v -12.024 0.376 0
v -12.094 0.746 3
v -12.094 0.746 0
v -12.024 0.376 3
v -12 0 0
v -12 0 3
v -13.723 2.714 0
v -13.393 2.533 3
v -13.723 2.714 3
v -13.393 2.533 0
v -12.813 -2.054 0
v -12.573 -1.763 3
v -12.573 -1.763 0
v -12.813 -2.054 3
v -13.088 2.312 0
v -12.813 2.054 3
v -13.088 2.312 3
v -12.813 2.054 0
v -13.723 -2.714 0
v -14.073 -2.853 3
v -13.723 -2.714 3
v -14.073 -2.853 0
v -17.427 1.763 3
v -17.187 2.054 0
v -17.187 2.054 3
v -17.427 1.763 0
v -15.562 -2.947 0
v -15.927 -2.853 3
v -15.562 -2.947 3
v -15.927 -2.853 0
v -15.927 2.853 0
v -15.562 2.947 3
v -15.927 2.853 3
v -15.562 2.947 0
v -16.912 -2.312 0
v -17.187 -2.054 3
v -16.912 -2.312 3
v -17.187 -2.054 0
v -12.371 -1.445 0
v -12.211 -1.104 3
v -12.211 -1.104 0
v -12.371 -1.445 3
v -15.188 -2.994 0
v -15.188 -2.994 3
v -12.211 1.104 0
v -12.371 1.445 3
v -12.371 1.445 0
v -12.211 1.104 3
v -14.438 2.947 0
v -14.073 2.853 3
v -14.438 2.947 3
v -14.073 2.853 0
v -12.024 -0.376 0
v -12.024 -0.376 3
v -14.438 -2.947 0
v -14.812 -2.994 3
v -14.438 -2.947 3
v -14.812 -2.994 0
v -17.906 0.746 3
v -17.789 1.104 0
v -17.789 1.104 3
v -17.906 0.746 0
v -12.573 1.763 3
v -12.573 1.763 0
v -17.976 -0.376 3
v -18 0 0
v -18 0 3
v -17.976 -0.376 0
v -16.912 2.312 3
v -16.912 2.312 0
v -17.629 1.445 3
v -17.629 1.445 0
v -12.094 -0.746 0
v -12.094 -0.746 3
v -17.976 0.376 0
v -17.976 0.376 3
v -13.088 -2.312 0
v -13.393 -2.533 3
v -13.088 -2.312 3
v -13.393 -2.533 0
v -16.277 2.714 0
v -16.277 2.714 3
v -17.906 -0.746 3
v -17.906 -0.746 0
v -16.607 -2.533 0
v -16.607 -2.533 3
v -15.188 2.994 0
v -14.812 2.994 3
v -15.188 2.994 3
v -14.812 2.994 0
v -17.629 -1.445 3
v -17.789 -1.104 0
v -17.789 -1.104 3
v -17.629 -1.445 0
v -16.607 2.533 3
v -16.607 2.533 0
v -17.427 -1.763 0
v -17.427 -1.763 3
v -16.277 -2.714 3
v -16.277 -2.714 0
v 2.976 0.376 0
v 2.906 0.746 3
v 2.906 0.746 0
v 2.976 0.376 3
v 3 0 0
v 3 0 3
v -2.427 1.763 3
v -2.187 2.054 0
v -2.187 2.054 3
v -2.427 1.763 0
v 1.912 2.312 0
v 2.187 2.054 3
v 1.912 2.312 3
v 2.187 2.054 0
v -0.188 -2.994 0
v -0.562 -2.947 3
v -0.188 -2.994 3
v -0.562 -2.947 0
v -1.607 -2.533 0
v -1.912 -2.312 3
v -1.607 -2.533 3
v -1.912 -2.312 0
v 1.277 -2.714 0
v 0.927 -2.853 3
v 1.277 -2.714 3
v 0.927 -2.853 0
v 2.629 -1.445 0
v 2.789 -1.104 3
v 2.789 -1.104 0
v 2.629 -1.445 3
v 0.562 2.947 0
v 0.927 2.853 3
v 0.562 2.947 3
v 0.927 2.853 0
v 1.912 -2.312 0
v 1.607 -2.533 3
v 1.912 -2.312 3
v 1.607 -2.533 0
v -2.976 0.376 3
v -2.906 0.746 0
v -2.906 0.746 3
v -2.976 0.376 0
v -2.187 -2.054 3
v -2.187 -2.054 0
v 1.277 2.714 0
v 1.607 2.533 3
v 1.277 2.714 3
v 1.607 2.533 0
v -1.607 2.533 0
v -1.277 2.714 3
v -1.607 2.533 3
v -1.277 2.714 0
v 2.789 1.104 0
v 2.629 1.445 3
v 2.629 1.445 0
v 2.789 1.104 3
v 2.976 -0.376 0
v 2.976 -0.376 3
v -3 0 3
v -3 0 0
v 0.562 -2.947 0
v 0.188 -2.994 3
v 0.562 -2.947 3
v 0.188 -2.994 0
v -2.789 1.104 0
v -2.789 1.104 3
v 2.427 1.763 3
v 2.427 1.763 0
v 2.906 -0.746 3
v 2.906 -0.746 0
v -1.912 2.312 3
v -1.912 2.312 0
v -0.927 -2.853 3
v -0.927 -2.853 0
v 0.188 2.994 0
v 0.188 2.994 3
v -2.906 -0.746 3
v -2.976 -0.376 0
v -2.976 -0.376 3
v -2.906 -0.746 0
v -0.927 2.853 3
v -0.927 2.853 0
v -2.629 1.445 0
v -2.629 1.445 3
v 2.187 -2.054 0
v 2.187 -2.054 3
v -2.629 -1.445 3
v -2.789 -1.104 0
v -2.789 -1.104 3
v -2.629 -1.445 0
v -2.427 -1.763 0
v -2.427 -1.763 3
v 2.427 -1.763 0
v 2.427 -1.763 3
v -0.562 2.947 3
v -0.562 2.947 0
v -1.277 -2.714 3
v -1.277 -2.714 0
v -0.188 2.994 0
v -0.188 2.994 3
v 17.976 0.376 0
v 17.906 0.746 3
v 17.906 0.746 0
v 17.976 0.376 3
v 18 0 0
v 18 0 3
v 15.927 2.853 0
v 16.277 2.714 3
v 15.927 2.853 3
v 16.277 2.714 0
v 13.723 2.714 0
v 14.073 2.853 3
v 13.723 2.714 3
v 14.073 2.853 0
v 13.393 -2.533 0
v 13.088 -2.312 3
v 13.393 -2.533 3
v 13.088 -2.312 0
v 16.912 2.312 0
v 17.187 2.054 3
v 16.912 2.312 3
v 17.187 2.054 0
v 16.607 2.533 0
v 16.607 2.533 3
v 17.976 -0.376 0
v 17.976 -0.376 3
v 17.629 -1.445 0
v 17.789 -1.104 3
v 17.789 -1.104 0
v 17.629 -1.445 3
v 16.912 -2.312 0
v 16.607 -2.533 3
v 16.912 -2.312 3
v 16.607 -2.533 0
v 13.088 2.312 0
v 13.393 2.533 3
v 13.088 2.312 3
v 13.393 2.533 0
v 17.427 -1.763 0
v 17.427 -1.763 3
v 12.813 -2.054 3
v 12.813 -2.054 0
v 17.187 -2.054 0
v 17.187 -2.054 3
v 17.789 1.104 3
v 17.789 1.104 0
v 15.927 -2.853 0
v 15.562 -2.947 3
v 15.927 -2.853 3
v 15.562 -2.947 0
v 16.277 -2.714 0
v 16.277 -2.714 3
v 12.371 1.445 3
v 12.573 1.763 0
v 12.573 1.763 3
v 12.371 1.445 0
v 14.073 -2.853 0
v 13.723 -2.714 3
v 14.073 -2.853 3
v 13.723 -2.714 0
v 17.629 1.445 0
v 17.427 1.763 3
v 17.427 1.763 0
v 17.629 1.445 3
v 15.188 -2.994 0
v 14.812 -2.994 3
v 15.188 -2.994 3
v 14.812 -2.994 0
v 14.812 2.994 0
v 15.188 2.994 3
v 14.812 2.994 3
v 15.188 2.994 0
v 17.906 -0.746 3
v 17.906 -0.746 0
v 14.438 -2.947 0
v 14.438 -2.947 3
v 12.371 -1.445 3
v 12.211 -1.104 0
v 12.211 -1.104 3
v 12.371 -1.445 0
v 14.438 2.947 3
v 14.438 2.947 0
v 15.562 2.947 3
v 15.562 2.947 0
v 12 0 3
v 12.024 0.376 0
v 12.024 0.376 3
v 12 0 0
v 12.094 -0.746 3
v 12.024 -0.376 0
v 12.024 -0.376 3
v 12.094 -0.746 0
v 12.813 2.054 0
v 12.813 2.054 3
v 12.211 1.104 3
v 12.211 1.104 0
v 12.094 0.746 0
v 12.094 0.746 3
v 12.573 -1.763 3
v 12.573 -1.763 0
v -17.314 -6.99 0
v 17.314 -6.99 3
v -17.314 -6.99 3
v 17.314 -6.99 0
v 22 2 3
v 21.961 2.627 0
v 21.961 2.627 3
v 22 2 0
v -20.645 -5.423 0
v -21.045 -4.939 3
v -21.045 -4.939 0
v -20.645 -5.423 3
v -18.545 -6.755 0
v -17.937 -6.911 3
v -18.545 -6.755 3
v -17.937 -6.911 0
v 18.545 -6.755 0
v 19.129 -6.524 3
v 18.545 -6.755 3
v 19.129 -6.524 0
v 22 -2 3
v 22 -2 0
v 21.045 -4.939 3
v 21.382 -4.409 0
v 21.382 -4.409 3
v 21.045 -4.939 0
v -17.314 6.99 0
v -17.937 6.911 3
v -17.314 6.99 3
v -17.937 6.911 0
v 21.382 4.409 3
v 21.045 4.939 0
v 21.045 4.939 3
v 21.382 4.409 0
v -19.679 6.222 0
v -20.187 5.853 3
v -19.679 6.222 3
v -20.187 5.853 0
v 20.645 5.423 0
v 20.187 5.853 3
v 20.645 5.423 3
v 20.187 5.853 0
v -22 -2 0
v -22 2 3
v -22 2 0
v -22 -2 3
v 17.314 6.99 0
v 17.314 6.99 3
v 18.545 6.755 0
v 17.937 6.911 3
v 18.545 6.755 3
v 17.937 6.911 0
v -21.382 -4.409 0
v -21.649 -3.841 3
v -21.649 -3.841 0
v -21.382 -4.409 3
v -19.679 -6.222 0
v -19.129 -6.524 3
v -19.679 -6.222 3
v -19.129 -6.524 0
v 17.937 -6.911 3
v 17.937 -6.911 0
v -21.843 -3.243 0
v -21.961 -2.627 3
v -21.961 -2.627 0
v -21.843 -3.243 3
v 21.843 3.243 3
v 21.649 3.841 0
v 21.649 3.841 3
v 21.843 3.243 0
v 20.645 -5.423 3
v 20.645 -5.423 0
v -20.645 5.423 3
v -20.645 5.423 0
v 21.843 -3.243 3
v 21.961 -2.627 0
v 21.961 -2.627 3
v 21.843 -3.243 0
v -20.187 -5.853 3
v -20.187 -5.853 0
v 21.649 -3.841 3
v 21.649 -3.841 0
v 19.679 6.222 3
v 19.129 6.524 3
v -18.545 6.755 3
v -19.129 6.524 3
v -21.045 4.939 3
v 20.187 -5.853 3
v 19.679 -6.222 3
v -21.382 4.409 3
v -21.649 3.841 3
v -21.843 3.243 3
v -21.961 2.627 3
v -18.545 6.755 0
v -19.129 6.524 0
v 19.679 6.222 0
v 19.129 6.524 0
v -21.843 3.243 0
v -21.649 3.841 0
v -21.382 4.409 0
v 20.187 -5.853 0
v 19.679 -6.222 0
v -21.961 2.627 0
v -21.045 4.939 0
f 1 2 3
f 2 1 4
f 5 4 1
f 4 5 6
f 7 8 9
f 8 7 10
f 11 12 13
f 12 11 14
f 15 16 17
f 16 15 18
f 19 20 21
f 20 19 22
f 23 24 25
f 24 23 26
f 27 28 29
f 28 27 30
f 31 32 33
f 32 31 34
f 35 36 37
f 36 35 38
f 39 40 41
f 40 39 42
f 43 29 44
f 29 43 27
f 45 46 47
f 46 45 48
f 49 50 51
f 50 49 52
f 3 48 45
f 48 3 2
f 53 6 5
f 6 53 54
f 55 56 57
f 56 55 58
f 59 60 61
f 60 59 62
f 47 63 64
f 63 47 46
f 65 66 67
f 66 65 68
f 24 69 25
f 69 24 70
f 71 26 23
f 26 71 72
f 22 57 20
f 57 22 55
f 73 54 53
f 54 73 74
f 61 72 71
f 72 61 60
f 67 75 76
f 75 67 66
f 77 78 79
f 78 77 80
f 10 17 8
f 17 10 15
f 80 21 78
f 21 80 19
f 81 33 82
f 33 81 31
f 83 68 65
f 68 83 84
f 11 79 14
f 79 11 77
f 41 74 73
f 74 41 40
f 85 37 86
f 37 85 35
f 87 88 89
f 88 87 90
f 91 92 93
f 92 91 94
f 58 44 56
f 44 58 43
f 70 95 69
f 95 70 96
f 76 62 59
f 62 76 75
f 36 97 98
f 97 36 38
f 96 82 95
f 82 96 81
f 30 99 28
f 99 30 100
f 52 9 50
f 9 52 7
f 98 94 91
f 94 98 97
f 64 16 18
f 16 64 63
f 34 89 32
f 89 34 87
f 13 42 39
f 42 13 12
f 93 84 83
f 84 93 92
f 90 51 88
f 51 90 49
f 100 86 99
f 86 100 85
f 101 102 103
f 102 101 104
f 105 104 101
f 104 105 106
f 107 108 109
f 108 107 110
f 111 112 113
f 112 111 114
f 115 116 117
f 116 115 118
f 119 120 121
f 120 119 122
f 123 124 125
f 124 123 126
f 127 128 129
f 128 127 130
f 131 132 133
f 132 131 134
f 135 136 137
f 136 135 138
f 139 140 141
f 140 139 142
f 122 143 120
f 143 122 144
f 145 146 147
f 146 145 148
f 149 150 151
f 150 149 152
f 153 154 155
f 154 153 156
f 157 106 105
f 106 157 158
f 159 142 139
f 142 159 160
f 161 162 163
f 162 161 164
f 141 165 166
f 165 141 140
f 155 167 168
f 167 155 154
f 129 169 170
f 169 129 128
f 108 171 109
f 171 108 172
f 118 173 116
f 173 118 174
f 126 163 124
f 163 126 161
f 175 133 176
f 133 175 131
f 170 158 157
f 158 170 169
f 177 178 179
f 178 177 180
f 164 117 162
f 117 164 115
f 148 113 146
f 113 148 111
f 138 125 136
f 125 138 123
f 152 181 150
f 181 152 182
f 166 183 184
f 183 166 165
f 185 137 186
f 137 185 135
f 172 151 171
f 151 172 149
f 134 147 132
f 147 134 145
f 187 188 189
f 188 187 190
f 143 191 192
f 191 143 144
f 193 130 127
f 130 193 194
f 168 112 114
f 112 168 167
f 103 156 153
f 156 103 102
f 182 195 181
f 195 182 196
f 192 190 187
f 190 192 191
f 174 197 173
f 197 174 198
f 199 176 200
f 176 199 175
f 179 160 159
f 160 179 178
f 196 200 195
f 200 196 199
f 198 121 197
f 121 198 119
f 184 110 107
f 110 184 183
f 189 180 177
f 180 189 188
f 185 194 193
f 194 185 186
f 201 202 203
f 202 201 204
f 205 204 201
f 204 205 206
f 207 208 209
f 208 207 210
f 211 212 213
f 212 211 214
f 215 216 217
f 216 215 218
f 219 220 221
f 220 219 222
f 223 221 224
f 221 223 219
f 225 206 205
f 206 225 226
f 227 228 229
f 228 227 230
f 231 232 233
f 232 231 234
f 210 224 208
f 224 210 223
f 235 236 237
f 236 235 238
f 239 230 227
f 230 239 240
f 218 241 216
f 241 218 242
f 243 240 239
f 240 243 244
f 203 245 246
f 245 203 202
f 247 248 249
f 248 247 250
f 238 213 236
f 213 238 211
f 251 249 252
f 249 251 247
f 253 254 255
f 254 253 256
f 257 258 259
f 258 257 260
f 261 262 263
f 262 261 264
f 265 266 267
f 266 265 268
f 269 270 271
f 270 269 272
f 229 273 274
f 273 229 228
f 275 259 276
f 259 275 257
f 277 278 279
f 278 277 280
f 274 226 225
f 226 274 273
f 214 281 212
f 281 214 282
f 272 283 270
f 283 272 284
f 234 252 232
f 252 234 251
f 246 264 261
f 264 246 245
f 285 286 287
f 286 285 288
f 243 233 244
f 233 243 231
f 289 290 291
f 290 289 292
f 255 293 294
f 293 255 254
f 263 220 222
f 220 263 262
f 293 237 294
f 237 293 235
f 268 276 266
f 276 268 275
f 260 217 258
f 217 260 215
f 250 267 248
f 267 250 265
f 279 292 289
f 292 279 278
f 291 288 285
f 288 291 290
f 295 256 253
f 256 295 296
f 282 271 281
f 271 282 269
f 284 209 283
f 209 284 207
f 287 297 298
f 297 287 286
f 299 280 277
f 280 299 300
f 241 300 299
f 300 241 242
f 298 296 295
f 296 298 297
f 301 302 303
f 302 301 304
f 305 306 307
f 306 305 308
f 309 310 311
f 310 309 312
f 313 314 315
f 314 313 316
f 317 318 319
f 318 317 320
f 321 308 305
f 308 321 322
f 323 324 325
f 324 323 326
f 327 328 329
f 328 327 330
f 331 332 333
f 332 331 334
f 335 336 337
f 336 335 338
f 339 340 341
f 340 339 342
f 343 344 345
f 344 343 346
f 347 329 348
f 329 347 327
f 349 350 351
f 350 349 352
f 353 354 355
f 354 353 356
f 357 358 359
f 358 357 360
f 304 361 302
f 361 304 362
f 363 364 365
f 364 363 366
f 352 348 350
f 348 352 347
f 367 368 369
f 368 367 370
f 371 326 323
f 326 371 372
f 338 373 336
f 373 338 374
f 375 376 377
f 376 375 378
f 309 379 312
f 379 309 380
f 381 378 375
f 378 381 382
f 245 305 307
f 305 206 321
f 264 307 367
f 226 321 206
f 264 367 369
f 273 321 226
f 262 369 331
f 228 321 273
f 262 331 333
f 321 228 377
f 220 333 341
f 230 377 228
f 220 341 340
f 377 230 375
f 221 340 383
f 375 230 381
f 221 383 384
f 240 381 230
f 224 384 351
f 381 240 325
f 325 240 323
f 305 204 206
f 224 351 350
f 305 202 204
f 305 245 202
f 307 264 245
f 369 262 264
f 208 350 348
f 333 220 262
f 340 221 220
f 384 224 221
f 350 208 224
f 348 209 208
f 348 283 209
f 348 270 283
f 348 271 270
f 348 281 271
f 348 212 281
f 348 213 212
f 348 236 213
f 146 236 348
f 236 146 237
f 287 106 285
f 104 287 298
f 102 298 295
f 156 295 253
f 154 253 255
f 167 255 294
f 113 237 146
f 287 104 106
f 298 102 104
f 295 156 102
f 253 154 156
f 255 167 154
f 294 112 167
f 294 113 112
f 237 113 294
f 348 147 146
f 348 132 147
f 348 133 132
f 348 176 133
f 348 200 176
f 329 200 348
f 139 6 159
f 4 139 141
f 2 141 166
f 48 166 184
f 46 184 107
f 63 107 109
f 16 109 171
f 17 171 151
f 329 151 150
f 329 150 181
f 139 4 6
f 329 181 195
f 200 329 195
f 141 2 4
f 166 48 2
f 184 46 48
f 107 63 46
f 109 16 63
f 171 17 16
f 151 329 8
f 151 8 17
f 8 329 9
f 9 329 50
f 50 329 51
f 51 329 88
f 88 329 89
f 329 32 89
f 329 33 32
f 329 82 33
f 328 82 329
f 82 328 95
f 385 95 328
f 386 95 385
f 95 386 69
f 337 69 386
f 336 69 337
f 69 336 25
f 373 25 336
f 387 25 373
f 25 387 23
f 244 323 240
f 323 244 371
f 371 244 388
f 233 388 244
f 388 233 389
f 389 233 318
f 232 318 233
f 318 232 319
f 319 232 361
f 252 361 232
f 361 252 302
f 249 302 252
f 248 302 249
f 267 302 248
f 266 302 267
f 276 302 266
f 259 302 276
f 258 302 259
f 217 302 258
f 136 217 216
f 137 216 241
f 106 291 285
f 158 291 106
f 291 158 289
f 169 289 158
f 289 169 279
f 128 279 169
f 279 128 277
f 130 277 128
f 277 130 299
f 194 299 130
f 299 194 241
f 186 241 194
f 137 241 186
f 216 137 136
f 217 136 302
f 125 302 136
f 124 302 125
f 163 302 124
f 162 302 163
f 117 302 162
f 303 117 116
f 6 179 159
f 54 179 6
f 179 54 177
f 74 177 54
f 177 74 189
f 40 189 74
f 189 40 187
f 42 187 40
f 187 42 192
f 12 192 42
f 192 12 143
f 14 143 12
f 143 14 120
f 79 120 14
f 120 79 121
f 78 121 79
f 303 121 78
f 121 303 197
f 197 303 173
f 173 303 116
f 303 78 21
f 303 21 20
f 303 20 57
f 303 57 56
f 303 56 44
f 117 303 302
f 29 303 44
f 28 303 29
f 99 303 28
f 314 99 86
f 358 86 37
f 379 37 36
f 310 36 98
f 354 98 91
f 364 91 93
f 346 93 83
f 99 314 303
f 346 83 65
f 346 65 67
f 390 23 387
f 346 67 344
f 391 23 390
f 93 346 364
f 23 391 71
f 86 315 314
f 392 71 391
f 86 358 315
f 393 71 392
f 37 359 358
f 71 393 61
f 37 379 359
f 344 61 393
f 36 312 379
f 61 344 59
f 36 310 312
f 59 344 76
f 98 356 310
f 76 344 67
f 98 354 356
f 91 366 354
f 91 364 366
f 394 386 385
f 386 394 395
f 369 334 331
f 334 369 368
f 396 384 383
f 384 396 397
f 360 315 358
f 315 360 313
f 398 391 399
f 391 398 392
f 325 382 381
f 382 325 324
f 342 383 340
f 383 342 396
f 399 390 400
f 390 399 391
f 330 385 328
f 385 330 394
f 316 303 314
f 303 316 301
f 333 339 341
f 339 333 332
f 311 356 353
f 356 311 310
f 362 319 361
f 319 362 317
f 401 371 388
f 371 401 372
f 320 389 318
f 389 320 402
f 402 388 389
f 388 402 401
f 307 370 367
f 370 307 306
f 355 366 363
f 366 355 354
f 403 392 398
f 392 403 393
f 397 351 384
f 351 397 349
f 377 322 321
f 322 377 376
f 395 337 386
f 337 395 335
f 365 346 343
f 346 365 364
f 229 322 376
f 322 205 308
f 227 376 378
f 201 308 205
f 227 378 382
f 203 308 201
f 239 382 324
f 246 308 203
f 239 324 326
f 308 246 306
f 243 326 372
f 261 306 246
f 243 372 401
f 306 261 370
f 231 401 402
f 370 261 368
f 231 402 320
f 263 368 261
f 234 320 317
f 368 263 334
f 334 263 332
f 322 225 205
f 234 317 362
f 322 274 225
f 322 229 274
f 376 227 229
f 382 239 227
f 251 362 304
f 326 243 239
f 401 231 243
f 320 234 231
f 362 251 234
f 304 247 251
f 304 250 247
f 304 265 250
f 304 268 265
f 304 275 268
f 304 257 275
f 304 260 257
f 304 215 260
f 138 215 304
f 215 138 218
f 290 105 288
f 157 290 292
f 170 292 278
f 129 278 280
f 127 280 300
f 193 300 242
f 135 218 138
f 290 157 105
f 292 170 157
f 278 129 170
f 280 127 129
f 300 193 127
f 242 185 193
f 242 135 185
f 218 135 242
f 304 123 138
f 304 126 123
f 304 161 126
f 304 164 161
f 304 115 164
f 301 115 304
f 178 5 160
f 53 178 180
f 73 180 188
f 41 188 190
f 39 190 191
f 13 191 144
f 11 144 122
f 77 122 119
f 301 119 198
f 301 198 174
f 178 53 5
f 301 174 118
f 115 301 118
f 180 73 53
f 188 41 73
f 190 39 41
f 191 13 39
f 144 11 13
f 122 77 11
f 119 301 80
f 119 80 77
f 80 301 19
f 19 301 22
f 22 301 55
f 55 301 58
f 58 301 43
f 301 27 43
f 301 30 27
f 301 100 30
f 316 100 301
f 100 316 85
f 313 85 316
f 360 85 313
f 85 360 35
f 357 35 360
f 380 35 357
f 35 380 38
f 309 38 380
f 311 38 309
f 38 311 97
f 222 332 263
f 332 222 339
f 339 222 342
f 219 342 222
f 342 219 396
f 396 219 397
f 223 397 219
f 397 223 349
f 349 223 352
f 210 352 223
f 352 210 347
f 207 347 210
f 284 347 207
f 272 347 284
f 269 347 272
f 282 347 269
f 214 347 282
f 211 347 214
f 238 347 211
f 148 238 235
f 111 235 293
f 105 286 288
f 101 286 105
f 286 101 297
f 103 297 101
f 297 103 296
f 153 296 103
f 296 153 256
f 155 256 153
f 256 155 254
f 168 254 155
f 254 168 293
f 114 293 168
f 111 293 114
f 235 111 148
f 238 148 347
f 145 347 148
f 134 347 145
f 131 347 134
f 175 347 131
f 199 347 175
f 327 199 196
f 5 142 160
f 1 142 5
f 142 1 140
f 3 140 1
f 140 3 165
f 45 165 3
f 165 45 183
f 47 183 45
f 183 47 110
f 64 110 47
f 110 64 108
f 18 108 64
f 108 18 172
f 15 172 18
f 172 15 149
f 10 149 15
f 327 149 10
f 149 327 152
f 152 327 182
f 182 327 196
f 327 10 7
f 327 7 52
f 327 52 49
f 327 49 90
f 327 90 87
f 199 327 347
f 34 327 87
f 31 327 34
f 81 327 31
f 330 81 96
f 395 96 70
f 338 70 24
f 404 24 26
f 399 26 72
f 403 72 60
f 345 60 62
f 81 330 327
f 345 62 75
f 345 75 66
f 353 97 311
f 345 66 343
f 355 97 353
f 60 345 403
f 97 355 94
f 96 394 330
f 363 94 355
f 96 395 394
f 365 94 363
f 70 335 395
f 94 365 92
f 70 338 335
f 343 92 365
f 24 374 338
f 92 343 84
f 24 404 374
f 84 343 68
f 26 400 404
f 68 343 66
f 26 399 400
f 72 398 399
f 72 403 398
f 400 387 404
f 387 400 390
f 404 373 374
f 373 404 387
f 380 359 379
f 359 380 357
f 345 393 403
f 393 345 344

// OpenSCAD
$fn = 50;


difference() {
	union() {
		translate(v = [0, 0, 0]) {
			rotate(a = [0, 0, 0]) {
				hull() {
					translate(v = [-17.0000000000, 2.0000000000, 0]) {
						rotate(a = [0, 0, 0]) {
							translate(v = [0, 0, 0]) {
								rotate(a = [0, 0, 0]) {
									cylinder(h = 3, r = 5);
								}
							}
						}
					}
					translate(v = [17.0000000000, 2.0000000000, 0]) {
						rotate(a = [0, 0, 0]) {
							translate(v = [0, 0, 0]) {
								rotate(a = [0, 0, 0]) {
									cylinder(h = 3, r = 5);
								}
							}
						}
					}
					translate(v = [-17.0000000000, -2.0000000000, 0]) {
						rotate(a = [0, 0, 0]) {
							translate(v = [0, 0, 0]) {
								rotate(a = [0, 0, 0]) {
									cylinder(h = 3, r = 5);
								}
							}
						}
					}
					translate(v = [17.0000000000, -2.0000000000, 0]) {
						rotate(a = [0, 0, 0]) {
							translate(v = [0, 0, 0]) {
								rotate(a = [0, 0, 0]) {
									cylinder(h = 3, r = 5);
								}
							}
						}
					}
				}
			}
		}
	}
	union() {
		translate(v = [-15.0000000000, 0.0000000000, 0]) {
			rotate(a = [0, 0, 0]) {
				translate(v = [0, 0, -50]) {
					rotate(a = [0, 0, 0]) {
						cylinder(h = 100, r = 3.0000000000);
					}
				}
			}
		}
		translate(v = [0.0000000000, 0.0000000000, 0]) {
			rotate(a = [0, 0, 0]) {
				translate(v = [0, 0, -50]) {
					rotate(a = [0, 0, 0]) {
						cylinder(h = 100, r = 3.0000000000);
					}
				}
			}
		}
		translate(v = [15.0000000000, 0.0000000000, 0]) {
			rotate(a = [0, 0, 0]) {
				translate(v = [0, 0, -50]) {
					rotate(a = [0, 0, 0]) {
						cylinder(h = 100, r = 3.0000000000);
					}
				}
			}
		}
	}
}
